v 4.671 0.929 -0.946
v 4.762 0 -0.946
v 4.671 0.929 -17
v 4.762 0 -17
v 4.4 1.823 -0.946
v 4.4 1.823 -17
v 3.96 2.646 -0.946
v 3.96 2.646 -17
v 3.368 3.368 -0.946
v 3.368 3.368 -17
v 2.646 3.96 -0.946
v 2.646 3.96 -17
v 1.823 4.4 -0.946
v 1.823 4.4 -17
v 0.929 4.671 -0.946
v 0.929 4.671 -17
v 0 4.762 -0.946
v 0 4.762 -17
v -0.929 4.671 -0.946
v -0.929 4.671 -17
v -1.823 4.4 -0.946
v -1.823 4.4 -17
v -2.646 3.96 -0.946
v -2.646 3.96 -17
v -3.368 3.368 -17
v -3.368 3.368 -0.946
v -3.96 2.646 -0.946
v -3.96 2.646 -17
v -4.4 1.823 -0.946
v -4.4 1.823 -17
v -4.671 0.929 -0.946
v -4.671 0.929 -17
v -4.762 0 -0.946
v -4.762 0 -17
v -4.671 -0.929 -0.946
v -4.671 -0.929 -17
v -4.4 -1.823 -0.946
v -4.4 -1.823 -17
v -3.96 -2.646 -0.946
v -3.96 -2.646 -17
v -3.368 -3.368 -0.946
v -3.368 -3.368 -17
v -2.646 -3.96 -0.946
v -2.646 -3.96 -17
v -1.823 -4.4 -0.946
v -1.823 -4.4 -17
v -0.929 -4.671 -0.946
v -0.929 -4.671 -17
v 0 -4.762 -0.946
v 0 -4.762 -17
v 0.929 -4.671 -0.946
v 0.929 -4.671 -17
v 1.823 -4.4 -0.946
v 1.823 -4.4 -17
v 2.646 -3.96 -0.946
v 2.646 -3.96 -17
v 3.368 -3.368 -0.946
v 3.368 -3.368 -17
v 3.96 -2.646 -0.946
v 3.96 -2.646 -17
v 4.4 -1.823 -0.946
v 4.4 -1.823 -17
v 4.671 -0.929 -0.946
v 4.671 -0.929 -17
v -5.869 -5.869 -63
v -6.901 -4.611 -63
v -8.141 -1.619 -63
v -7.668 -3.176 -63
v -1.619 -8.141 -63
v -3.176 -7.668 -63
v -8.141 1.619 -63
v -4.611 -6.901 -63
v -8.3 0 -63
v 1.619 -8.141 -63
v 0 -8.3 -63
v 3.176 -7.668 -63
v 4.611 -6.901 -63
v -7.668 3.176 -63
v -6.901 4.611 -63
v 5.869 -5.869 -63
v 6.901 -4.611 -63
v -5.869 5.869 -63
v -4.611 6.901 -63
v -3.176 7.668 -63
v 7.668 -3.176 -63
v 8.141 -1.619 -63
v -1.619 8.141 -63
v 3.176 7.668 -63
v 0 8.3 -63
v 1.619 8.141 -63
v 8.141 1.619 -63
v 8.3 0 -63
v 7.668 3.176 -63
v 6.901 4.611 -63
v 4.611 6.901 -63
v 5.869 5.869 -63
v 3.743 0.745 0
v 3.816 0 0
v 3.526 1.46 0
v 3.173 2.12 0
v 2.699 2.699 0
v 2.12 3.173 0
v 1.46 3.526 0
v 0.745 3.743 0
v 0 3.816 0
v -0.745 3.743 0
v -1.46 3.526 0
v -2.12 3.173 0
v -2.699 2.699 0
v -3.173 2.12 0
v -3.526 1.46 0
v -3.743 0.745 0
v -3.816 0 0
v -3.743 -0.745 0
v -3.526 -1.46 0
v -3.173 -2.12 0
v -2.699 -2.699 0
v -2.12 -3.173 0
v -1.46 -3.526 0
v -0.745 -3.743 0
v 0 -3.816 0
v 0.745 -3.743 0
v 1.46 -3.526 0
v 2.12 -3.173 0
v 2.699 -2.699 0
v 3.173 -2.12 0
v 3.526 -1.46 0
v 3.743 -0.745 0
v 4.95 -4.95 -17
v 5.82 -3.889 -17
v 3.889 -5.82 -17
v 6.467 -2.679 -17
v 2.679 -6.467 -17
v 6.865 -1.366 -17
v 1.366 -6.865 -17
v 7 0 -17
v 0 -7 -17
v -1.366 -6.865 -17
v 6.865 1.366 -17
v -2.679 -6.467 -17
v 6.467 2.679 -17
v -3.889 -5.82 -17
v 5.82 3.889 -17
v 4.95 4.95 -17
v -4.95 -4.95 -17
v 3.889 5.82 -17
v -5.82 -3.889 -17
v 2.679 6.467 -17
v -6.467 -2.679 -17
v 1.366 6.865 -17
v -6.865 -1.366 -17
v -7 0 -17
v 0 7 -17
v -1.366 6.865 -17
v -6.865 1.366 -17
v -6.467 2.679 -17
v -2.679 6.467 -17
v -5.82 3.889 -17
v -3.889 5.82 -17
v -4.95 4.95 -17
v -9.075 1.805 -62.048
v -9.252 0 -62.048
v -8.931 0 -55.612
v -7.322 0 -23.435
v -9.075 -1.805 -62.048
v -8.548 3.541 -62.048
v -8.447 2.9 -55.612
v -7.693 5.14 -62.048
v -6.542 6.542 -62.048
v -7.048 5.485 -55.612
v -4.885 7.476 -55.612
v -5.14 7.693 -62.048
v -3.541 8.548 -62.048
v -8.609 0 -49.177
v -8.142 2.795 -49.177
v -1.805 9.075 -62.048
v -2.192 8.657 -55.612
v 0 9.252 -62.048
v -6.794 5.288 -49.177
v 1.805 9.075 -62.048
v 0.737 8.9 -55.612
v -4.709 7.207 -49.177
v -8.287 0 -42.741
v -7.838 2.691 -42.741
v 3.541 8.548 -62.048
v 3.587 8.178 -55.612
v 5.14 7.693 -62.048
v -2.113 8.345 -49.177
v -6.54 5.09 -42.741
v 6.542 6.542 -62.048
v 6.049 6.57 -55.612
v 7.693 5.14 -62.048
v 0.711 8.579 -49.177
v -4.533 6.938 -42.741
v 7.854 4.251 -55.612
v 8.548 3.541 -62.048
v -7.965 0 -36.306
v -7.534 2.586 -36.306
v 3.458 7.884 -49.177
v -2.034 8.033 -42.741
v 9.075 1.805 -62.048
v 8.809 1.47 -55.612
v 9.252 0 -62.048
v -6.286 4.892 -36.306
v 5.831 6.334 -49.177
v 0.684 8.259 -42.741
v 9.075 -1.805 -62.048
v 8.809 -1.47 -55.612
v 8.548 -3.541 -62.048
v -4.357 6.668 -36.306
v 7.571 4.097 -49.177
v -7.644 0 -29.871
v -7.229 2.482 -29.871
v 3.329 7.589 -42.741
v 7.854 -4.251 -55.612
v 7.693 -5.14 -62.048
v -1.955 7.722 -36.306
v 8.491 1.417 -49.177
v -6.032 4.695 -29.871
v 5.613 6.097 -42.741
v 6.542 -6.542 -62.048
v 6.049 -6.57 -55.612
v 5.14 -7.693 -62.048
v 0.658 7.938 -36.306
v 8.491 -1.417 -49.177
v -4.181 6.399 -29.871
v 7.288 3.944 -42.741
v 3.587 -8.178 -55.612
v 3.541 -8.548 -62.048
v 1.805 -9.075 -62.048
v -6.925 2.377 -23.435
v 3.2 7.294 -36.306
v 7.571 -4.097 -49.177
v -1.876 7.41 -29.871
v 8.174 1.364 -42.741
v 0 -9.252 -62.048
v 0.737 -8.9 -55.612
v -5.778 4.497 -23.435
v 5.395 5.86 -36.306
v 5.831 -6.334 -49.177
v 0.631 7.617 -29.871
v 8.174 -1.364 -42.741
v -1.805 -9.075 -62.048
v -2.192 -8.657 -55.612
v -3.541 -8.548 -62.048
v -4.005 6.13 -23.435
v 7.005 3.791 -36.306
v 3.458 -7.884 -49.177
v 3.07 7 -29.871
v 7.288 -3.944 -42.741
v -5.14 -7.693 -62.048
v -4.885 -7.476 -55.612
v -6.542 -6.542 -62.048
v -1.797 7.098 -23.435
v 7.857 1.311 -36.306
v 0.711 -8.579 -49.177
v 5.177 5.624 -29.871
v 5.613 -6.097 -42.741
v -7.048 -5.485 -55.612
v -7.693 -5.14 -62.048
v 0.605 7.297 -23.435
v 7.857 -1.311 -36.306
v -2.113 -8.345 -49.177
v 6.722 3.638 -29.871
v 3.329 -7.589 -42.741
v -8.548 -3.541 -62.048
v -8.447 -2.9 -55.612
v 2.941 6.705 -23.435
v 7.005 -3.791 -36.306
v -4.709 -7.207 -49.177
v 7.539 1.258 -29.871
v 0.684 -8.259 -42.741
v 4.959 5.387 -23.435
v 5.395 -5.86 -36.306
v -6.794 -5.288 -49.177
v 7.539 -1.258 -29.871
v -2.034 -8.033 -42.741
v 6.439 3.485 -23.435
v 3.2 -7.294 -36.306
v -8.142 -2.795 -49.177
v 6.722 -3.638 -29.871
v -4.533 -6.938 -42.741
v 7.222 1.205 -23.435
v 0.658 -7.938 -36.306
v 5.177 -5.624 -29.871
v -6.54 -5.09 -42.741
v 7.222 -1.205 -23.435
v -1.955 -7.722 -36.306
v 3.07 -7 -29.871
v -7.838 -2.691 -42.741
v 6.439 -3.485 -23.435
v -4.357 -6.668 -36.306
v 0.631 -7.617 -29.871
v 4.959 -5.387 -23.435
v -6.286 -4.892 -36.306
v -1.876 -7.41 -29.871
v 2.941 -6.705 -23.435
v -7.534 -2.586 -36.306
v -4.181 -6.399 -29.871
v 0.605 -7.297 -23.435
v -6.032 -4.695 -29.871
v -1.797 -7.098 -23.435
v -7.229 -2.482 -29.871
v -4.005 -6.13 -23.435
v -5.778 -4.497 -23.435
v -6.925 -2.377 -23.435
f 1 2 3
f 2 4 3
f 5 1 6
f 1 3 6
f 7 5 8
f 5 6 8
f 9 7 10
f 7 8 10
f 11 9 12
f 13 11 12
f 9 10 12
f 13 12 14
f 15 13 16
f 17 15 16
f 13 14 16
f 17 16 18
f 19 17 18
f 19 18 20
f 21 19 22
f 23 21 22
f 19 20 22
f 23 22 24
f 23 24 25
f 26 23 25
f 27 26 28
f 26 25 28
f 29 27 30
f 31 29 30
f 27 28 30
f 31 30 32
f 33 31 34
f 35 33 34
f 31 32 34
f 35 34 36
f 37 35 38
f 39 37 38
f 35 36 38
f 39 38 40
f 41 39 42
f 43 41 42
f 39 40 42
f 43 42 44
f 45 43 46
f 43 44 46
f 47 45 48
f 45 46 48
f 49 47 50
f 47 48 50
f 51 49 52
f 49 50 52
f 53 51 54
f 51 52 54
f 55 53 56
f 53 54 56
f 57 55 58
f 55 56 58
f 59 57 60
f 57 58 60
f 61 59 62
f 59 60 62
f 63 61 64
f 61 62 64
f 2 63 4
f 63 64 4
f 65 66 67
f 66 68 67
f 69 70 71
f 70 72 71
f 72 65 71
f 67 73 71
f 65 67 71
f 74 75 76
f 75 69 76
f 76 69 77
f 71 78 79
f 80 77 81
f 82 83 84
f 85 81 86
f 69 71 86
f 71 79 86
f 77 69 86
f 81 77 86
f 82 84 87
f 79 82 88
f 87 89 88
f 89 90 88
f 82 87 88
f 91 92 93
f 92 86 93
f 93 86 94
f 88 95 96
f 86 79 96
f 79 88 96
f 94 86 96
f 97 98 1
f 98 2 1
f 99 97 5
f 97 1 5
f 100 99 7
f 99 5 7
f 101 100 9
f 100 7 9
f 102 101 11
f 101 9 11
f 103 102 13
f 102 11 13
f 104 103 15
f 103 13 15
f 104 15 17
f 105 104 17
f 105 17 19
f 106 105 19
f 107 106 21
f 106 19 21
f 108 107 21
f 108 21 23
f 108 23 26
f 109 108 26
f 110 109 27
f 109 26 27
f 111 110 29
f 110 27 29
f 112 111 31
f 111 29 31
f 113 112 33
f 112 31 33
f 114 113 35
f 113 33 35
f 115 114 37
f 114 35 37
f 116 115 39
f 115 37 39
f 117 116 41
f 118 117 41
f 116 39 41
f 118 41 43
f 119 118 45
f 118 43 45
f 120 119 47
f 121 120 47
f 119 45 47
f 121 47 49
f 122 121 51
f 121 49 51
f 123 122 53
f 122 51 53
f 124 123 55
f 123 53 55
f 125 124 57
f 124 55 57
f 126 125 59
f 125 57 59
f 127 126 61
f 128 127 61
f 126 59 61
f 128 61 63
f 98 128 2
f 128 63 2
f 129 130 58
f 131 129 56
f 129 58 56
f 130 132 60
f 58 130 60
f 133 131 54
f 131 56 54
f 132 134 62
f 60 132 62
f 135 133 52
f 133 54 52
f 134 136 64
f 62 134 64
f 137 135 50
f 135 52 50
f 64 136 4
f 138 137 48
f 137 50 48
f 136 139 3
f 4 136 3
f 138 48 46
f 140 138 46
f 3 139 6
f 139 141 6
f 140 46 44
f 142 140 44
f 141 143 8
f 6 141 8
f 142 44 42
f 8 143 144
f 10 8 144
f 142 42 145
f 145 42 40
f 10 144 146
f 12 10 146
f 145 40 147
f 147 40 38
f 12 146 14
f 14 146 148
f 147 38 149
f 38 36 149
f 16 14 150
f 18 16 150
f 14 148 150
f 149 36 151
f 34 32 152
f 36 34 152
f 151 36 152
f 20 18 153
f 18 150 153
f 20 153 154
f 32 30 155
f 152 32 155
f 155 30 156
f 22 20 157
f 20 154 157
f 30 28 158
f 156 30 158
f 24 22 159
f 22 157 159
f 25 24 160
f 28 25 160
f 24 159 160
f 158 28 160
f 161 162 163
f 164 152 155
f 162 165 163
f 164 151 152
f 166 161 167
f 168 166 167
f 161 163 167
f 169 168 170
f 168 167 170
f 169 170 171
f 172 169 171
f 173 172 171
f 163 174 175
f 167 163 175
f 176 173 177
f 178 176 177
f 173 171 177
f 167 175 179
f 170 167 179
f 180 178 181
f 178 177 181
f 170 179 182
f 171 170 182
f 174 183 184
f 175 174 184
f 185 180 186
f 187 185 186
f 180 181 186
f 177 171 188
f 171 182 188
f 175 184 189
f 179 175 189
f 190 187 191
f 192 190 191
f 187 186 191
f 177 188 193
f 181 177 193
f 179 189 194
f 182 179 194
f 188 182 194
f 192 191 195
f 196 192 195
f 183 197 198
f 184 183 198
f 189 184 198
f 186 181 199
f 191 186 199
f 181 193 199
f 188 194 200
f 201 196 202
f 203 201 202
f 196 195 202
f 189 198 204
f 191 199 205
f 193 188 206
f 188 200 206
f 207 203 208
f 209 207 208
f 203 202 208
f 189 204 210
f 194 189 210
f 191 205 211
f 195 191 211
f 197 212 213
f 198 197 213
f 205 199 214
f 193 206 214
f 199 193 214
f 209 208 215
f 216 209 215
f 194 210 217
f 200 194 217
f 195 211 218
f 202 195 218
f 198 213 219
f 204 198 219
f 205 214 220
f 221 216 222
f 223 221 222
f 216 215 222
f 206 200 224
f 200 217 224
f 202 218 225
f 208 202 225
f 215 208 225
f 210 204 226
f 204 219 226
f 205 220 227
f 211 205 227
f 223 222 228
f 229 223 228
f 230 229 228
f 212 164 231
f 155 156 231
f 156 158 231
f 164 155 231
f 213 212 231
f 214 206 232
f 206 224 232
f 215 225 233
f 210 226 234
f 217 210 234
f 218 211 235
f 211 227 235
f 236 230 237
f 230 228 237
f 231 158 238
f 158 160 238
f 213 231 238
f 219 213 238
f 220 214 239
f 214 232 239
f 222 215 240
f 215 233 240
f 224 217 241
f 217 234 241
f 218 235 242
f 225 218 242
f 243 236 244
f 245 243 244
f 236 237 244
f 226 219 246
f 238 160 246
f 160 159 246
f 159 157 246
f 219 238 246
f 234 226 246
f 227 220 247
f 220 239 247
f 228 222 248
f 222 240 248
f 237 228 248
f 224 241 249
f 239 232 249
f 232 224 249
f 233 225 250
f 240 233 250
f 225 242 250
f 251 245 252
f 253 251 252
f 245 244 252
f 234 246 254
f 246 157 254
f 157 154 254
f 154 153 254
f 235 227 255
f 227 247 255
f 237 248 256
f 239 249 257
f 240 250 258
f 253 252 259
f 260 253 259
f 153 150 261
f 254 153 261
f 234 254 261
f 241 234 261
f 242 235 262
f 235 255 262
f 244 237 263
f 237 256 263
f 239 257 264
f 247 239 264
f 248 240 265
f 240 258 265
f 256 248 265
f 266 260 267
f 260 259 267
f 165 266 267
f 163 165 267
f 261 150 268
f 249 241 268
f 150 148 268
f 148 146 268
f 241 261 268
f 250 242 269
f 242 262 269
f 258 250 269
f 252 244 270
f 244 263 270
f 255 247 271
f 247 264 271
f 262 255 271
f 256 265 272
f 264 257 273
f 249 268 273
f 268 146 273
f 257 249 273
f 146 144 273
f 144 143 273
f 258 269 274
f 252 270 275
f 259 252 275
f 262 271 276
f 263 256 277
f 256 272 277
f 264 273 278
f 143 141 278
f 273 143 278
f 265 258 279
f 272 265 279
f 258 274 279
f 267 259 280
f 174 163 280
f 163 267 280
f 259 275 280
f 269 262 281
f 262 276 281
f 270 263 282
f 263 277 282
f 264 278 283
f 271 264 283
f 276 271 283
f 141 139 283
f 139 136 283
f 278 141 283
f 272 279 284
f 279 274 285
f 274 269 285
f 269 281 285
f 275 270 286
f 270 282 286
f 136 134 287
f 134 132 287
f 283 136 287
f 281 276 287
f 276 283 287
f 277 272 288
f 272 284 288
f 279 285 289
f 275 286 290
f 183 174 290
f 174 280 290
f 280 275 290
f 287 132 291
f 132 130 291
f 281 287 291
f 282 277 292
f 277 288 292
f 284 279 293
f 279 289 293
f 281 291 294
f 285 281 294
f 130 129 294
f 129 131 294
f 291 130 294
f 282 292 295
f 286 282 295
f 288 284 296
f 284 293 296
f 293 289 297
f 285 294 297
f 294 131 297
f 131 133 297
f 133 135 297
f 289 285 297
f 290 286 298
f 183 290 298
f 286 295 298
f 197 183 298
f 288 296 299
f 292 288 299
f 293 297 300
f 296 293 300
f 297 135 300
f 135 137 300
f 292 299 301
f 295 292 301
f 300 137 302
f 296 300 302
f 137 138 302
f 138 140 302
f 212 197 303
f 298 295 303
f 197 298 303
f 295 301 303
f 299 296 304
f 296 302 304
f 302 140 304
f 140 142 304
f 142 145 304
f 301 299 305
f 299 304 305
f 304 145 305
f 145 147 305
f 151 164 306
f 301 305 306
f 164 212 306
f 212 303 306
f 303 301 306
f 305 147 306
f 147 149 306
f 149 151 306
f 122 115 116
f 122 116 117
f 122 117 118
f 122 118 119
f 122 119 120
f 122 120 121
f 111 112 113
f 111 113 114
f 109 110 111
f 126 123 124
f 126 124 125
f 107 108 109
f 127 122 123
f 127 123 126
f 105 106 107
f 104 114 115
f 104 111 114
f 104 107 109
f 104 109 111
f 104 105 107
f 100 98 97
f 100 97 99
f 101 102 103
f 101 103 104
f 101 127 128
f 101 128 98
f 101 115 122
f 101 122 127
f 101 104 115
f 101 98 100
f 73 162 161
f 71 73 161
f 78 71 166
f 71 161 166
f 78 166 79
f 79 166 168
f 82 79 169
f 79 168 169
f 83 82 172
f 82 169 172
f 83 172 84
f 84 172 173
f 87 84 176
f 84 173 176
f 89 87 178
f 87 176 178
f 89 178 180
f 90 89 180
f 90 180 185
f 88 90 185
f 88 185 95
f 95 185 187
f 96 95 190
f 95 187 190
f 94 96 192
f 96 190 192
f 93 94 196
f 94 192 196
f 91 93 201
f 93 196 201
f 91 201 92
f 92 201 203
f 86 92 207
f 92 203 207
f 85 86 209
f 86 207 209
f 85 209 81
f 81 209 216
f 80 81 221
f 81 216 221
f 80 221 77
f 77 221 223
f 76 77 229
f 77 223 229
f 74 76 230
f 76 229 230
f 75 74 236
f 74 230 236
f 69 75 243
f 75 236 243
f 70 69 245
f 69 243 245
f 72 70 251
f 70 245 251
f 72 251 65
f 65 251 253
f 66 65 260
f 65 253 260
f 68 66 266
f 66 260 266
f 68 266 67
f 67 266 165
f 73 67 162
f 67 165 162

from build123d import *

# Parameters (mm, degrees)
SKETCH_1_R      = 5
EXTRUDE_1_DEPTH = 17
CHAMFER_1_SIZE  = 1
CHAMFER_1_SIZE2 = 0.953570685


# Read off the part's stored shape, not the designer's step: 3/8-16 机械螺纹 螺柱1
with BuildPart() as part:
    # 草图1 → 凸台-拉伸1 (new body)
    with BuildSketch(Plane.XY):
        Circle(SKETCH_1_R)
    extrude(amount=-EXTRUDE_1_DEPTH)

    # 3/8-16 机械螺纹 螺柱1 outline → 3/8-16 机械螺纹 螺柱1 (revolve, cut)
    with BuildSketch(Plane.XZ):
        Polygon((5, 0), (3.81635, 0), (4.7625, -0.94615), (4.7625, -17), (5, -17), align=None)
    revolve(axis=Axis((0, 0, 0), (0, 0, 1)), mode=Mode.SUBTRACT)

    # 草图4 → 旋转1 (revolve)
    with BuildSketch(Plane(origin=(0, 0, 0), x_dir=(0, 0, -1), z_dir=(1, 0, 0)), mode=Mode.PRIVATE) as revolve_1_sk:
        Polygon((17, 0), (37.344329095, 0), (63, 0), (63, 9.3), (17, 7), align=None)
    revolve(revolve_1_sk.sketch.rotate(Axis((0, 0, -37.344329095), (0, 0, -1)), 270), axis=Axis((0, 0, -37.344329095), (0, 0, -1)))

    # 倒角1
    chamfer_1_edges = [part.edges().sort_by_distance(p)[0] for p in [
        (9.3, 0, -63),
    ]]
    chamfer_1_side = [part.faces().sort_by_distance(p)[0] for p in [
        (0, 0, -63),
    ]]
    chamfer(chamfer_1_edges, length=CHAMFER_1_SIZE, length2=CHAMFER_1_SIZE2, reference=chamfer_1_side[0])


solid = part.part
